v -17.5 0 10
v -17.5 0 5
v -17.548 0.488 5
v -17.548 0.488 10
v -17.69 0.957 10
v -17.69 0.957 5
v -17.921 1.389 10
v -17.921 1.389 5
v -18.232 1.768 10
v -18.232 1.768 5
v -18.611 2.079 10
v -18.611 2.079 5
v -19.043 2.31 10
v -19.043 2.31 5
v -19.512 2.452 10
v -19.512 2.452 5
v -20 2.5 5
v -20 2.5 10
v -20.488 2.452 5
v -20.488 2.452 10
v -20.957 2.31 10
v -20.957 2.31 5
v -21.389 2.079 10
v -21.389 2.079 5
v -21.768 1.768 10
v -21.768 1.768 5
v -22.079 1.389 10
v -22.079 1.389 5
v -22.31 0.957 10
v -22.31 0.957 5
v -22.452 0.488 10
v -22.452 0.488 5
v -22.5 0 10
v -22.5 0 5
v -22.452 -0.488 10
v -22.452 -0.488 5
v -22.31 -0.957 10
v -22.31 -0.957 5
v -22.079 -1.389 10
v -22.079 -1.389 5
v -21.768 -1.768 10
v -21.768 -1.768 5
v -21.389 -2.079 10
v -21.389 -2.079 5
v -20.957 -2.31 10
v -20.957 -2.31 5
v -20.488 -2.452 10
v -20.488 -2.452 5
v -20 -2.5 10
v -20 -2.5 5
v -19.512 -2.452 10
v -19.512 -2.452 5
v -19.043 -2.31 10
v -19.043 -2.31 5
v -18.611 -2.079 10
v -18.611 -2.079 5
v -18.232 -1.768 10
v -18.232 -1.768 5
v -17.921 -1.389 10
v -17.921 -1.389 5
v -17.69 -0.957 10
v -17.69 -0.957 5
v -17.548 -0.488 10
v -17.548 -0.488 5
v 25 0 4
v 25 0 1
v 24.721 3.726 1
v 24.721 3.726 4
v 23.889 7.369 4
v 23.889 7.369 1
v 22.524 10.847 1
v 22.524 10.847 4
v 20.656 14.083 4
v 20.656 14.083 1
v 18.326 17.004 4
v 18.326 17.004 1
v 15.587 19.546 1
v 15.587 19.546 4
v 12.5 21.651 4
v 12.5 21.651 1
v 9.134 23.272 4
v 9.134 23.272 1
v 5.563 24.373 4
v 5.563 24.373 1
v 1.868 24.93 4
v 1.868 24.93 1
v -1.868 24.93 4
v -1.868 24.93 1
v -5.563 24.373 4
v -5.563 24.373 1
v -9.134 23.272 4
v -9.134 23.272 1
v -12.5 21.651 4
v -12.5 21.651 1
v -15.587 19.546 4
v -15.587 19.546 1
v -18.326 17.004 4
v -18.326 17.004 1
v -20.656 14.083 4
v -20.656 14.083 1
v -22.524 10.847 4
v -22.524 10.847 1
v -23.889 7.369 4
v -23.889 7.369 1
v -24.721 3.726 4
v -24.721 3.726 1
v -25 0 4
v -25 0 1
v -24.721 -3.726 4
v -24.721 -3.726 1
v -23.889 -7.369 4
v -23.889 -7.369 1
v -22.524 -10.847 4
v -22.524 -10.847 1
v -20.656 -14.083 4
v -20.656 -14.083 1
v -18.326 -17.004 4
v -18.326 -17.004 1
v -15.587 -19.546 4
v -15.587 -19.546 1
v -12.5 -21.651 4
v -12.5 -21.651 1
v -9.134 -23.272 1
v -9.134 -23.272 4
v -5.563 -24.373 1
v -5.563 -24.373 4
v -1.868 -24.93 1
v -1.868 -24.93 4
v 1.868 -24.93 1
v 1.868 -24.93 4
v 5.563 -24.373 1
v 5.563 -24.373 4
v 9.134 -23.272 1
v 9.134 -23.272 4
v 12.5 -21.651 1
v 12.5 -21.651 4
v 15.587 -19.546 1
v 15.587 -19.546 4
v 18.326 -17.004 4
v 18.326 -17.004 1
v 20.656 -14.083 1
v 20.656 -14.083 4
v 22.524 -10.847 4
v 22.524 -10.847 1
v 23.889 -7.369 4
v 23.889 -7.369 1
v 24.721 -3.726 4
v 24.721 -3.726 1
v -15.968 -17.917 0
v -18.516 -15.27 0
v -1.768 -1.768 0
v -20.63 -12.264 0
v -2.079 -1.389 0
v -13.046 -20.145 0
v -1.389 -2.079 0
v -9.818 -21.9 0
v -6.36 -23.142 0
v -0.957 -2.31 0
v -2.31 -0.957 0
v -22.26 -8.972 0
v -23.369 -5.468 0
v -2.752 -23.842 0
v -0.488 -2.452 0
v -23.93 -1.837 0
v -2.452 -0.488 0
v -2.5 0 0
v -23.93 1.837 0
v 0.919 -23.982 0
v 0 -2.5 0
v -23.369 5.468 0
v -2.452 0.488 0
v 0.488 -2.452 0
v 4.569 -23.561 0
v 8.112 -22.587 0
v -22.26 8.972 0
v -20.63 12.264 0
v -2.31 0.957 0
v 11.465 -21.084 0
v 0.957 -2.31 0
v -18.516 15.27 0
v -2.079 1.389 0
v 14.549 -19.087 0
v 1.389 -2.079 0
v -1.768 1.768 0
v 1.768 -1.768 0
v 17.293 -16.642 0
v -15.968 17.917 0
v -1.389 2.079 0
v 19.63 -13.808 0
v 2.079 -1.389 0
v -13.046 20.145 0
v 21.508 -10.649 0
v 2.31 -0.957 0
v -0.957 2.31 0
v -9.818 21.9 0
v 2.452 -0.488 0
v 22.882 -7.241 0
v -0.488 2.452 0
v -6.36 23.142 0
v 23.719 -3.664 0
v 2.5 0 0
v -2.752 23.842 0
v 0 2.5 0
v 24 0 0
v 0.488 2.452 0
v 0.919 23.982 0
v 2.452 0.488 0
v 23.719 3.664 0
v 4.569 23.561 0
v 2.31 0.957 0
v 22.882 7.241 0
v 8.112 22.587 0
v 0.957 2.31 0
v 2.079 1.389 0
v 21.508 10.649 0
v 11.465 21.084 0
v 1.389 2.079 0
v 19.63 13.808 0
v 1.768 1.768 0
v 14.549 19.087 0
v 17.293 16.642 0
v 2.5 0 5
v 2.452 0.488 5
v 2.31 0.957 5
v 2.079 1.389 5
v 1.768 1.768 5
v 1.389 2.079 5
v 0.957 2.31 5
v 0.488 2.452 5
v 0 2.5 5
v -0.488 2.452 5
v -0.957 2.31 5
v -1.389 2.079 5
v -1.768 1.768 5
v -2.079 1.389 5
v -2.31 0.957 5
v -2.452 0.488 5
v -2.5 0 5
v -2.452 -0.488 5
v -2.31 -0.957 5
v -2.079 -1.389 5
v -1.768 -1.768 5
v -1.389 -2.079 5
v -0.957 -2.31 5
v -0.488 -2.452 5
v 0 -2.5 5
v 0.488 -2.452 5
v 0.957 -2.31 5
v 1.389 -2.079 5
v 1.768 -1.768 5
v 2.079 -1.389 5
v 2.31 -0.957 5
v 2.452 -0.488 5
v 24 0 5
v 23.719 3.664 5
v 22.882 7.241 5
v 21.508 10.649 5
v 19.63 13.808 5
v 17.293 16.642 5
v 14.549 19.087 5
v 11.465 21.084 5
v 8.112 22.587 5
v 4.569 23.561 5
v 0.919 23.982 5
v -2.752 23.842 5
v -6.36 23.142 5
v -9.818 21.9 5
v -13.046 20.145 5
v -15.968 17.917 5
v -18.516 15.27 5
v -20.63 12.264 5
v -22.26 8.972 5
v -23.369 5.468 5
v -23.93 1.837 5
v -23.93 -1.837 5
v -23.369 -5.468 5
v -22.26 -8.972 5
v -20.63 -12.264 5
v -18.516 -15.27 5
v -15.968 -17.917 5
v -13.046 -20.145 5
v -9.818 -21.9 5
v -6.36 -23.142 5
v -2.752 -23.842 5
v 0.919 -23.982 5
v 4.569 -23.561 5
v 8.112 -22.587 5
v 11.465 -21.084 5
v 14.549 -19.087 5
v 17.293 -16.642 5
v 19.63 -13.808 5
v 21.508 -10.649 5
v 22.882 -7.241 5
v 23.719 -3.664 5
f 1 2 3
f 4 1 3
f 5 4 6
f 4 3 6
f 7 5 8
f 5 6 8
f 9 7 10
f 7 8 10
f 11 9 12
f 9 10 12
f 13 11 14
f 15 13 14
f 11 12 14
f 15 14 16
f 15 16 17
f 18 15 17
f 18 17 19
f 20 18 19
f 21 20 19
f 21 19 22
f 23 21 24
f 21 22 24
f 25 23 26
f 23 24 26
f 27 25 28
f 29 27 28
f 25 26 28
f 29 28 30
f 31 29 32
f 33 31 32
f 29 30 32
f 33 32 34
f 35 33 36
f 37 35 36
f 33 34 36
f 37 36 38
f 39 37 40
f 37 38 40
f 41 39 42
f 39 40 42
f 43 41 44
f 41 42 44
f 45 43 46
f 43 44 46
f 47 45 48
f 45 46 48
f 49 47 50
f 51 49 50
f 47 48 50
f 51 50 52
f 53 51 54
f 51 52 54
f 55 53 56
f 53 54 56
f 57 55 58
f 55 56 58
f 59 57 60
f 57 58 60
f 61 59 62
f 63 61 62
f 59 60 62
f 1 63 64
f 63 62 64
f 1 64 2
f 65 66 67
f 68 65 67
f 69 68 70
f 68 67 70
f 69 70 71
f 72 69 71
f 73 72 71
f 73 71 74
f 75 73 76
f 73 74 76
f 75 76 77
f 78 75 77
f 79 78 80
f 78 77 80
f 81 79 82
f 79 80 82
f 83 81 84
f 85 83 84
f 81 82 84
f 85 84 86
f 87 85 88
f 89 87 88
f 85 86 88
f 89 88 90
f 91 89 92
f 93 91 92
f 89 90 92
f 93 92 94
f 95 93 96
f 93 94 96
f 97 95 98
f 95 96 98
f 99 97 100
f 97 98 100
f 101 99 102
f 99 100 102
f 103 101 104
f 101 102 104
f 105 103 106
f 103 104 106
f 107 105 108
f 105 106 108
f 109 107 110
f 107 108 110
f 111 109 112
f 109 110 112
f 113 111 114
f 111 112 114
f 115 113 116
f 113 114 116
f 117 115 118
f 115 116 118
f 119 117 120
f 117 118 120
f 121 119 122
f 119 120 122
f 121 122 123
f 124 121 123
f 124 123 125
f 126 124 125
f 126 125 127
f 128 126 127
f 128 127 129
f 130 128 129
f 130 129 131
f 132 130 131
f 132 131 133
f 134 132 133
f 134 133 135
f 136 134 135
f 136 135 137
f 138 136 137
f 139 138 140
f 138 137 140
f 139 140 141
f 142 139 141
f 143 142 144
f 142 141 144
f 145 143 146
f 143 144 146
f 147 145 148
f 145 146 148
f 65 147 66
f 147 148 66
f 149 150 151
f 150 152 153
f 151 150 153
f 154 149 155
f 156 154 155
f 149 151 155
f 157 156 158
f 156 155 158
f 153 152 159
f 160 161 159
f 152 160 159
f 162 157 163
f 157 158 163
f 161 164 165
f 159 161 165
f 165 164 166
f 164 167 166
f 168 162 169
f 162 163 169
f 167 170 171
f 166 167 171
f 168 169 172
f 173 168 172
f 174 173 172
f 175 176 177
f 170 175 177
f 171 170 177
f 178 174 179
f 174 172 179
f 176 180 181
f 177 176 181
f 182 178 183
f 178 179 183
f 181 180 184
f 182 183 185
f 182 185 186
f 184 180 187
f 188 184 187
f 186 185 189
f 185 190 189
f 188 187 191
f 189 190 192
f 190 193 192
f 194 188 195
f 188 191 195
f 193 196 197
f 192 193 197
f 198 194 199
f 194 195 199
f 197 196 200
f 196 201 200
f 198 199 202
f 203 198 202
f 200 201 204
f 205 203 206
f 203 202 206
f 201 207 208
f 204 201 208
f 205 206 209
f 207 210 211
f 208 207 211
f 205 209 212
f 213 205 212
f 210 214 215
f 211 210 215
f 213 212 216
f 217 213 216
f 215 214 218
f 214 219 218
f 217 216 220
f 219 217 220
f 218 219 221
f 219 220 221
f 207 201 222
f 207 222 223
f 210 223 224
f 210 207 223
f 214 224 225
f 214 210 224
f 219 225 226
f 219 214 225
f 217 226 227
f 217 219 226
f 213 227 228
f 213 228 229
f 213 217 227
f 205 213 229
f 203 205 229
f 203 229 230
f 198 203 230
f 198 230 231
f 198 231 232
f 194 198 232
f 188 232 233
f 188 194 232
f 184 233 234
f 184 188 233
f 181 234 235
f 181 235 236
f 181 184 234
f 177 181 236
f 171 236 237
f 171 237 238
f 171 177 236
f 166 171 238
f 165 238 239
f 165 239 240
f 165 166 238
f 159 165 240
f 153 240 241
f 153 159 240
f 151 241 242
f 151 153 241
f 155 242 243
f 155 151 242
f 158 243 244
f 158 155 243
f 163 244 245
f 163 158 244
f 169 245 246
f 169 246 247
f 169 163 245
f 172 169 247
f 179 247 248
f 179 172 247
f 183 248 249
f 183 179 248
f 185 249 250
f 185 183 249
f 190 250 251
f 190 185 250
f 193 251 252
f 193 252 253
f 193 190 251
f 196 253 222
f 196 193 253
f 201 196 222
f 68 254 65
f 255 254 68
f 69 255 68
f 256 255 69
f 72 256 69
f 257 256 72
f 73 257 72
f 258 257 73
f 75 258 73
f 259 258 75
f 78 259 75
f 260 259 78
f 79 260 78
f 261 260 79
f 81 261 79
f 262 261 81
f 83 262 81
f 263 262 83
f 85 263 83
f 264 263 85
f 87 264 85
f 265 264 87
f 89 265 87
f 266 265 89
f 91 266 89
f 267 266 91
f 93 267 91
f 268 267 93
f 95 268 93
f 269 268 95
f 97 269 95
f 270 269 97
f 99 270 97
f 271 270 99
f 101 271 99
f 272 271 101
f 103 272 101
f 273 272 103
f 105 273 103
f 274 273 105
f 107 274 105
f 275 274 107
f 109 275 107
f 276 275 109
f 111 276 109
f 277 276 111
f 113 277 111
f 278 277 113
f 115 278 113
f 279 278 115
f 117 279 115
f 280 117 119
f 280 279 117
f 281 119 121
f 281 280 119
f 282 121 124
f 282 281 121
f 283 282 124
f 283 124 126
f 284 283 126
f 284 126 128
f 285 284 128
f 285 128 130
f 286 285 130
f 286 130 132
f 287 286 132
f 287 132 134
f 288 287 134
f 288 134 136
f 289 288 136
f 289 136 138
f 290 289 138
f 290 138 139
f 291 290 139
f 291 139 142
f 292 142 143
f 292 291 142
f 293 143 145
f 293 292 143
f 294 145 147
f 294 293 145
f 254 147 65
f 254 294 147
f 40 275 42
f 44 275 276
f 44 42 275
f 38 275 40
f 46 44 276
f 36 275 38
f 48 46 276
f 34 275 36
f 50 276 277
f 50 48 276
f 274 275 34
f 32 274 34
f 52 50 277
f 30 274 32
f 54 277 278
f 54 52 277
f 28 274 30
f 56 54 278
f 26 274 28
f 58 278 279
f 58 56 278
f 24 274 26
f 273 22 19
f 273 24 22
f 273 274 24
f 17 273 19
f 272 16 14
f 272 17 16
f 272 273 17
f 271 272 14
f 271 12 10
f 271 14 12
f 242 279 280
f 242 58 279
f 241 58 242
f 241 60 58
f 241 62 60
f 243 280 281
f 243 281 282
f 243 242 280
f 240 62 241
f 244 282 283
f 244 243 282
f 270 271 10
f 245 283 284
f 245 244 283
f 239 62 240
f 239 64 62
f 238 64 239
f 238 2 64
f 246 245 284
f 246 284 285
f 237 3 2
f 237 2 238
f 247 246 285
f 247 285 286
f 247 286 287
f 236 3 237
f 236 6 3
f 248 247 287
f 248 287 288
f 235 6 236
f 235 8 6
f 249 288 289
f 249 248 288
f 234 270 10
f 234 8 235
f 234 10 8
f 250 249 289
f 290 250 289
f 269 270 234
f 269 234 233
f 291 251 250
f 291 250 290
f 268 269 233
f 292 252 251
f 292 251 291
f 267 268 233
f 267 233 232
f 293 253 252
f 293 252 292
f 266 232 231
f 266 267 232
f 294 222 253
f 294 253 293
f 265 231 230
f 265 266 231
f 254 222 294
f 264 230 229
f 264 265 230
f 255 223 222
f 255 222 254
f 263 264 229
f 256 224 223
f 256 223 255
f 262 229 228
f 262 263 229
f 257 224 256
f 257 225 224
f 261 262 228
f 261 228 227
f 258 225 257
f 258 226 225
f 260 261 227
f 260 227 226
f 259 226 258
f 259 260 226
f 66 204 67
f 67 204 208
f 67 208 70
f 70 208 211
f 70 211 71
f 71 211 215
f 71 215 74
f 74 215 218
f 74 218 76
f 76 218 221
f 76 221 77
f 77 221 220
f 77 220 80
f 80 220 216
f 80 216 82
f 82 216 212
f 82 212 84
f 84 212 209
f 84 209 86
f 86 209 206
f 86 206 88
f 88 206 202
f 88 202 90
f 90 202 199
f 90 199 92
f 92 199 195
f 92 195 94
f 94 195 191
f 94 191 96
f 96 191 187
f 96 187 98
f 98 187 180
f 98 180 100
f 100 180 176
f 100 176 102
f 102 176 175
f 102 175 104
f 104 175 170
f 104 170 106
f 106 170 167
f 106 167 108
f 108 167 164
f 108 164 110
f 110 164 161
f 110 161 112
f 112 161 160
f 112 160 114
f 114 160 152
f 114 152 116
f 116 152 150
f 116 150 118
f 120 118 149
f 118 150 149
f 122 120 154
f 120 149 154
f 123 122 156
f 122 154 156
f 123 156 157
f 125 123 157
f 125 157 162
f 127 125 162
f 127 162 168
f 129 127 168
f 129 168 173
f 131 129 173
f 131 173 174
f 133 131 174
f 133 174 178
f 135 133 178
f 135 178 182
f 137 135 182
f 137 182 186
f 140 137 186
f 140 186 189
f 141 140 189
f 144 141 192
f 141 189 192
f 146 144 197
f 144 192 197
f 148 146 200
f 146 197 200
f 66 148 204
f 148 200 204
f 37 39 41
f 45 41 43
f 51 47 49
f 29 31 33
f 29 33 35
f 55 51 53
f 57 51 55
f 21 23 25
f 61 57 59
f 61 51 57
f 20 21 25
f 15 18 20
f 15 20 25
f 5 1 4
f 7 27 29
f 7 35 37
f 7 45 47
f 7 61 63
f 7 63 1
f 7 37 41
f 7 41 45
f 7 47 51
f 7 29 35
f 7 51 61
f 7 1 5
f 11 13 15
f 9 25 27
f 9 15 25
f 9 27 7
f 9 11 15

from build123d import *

# Parameters (mm, degrees)
SKETCH1_R           = 25
SKETCH1_R_2         = 2.5
BOSS_EXTRUDE1_DEPTH = 5
SKETCH2_R           = 2.5
BOSS_EXTRUDE2_DEPTH = 5
CHAMFER1_SIZE       = 1


with BuildPart() as part:
    # Sketch1 → Boss-Extrude1 (new body)
    with BuildSketch(Plane.XY):
        Circle(SKETCH1_R)
        Circle(SKETCH1_R_2, mode=Mode.SUBTRACT)
    extrude(amount=BOSS_EXTRUDE1_DEPTH)

    # Sketch2 → Boss-Extrude2 (add)
    with BuildSketch(Plane.XY.offset(5)):
        with Locations((-20, 0)):
            Circle(SKETCH2_R)
    extrude(amount=BOSS_EXTRUDE2_DEPTH)

    # Chamfer1
    chamfer1_edges = [part.edges().sort_by_distance(p)[0] for p in [
        (-25, 0, 0),
        (-25, 0, 5),
    ]]
    chamfer(chamfer1_edges, length=CHAMFER1_SIZE)


solid = part.part
